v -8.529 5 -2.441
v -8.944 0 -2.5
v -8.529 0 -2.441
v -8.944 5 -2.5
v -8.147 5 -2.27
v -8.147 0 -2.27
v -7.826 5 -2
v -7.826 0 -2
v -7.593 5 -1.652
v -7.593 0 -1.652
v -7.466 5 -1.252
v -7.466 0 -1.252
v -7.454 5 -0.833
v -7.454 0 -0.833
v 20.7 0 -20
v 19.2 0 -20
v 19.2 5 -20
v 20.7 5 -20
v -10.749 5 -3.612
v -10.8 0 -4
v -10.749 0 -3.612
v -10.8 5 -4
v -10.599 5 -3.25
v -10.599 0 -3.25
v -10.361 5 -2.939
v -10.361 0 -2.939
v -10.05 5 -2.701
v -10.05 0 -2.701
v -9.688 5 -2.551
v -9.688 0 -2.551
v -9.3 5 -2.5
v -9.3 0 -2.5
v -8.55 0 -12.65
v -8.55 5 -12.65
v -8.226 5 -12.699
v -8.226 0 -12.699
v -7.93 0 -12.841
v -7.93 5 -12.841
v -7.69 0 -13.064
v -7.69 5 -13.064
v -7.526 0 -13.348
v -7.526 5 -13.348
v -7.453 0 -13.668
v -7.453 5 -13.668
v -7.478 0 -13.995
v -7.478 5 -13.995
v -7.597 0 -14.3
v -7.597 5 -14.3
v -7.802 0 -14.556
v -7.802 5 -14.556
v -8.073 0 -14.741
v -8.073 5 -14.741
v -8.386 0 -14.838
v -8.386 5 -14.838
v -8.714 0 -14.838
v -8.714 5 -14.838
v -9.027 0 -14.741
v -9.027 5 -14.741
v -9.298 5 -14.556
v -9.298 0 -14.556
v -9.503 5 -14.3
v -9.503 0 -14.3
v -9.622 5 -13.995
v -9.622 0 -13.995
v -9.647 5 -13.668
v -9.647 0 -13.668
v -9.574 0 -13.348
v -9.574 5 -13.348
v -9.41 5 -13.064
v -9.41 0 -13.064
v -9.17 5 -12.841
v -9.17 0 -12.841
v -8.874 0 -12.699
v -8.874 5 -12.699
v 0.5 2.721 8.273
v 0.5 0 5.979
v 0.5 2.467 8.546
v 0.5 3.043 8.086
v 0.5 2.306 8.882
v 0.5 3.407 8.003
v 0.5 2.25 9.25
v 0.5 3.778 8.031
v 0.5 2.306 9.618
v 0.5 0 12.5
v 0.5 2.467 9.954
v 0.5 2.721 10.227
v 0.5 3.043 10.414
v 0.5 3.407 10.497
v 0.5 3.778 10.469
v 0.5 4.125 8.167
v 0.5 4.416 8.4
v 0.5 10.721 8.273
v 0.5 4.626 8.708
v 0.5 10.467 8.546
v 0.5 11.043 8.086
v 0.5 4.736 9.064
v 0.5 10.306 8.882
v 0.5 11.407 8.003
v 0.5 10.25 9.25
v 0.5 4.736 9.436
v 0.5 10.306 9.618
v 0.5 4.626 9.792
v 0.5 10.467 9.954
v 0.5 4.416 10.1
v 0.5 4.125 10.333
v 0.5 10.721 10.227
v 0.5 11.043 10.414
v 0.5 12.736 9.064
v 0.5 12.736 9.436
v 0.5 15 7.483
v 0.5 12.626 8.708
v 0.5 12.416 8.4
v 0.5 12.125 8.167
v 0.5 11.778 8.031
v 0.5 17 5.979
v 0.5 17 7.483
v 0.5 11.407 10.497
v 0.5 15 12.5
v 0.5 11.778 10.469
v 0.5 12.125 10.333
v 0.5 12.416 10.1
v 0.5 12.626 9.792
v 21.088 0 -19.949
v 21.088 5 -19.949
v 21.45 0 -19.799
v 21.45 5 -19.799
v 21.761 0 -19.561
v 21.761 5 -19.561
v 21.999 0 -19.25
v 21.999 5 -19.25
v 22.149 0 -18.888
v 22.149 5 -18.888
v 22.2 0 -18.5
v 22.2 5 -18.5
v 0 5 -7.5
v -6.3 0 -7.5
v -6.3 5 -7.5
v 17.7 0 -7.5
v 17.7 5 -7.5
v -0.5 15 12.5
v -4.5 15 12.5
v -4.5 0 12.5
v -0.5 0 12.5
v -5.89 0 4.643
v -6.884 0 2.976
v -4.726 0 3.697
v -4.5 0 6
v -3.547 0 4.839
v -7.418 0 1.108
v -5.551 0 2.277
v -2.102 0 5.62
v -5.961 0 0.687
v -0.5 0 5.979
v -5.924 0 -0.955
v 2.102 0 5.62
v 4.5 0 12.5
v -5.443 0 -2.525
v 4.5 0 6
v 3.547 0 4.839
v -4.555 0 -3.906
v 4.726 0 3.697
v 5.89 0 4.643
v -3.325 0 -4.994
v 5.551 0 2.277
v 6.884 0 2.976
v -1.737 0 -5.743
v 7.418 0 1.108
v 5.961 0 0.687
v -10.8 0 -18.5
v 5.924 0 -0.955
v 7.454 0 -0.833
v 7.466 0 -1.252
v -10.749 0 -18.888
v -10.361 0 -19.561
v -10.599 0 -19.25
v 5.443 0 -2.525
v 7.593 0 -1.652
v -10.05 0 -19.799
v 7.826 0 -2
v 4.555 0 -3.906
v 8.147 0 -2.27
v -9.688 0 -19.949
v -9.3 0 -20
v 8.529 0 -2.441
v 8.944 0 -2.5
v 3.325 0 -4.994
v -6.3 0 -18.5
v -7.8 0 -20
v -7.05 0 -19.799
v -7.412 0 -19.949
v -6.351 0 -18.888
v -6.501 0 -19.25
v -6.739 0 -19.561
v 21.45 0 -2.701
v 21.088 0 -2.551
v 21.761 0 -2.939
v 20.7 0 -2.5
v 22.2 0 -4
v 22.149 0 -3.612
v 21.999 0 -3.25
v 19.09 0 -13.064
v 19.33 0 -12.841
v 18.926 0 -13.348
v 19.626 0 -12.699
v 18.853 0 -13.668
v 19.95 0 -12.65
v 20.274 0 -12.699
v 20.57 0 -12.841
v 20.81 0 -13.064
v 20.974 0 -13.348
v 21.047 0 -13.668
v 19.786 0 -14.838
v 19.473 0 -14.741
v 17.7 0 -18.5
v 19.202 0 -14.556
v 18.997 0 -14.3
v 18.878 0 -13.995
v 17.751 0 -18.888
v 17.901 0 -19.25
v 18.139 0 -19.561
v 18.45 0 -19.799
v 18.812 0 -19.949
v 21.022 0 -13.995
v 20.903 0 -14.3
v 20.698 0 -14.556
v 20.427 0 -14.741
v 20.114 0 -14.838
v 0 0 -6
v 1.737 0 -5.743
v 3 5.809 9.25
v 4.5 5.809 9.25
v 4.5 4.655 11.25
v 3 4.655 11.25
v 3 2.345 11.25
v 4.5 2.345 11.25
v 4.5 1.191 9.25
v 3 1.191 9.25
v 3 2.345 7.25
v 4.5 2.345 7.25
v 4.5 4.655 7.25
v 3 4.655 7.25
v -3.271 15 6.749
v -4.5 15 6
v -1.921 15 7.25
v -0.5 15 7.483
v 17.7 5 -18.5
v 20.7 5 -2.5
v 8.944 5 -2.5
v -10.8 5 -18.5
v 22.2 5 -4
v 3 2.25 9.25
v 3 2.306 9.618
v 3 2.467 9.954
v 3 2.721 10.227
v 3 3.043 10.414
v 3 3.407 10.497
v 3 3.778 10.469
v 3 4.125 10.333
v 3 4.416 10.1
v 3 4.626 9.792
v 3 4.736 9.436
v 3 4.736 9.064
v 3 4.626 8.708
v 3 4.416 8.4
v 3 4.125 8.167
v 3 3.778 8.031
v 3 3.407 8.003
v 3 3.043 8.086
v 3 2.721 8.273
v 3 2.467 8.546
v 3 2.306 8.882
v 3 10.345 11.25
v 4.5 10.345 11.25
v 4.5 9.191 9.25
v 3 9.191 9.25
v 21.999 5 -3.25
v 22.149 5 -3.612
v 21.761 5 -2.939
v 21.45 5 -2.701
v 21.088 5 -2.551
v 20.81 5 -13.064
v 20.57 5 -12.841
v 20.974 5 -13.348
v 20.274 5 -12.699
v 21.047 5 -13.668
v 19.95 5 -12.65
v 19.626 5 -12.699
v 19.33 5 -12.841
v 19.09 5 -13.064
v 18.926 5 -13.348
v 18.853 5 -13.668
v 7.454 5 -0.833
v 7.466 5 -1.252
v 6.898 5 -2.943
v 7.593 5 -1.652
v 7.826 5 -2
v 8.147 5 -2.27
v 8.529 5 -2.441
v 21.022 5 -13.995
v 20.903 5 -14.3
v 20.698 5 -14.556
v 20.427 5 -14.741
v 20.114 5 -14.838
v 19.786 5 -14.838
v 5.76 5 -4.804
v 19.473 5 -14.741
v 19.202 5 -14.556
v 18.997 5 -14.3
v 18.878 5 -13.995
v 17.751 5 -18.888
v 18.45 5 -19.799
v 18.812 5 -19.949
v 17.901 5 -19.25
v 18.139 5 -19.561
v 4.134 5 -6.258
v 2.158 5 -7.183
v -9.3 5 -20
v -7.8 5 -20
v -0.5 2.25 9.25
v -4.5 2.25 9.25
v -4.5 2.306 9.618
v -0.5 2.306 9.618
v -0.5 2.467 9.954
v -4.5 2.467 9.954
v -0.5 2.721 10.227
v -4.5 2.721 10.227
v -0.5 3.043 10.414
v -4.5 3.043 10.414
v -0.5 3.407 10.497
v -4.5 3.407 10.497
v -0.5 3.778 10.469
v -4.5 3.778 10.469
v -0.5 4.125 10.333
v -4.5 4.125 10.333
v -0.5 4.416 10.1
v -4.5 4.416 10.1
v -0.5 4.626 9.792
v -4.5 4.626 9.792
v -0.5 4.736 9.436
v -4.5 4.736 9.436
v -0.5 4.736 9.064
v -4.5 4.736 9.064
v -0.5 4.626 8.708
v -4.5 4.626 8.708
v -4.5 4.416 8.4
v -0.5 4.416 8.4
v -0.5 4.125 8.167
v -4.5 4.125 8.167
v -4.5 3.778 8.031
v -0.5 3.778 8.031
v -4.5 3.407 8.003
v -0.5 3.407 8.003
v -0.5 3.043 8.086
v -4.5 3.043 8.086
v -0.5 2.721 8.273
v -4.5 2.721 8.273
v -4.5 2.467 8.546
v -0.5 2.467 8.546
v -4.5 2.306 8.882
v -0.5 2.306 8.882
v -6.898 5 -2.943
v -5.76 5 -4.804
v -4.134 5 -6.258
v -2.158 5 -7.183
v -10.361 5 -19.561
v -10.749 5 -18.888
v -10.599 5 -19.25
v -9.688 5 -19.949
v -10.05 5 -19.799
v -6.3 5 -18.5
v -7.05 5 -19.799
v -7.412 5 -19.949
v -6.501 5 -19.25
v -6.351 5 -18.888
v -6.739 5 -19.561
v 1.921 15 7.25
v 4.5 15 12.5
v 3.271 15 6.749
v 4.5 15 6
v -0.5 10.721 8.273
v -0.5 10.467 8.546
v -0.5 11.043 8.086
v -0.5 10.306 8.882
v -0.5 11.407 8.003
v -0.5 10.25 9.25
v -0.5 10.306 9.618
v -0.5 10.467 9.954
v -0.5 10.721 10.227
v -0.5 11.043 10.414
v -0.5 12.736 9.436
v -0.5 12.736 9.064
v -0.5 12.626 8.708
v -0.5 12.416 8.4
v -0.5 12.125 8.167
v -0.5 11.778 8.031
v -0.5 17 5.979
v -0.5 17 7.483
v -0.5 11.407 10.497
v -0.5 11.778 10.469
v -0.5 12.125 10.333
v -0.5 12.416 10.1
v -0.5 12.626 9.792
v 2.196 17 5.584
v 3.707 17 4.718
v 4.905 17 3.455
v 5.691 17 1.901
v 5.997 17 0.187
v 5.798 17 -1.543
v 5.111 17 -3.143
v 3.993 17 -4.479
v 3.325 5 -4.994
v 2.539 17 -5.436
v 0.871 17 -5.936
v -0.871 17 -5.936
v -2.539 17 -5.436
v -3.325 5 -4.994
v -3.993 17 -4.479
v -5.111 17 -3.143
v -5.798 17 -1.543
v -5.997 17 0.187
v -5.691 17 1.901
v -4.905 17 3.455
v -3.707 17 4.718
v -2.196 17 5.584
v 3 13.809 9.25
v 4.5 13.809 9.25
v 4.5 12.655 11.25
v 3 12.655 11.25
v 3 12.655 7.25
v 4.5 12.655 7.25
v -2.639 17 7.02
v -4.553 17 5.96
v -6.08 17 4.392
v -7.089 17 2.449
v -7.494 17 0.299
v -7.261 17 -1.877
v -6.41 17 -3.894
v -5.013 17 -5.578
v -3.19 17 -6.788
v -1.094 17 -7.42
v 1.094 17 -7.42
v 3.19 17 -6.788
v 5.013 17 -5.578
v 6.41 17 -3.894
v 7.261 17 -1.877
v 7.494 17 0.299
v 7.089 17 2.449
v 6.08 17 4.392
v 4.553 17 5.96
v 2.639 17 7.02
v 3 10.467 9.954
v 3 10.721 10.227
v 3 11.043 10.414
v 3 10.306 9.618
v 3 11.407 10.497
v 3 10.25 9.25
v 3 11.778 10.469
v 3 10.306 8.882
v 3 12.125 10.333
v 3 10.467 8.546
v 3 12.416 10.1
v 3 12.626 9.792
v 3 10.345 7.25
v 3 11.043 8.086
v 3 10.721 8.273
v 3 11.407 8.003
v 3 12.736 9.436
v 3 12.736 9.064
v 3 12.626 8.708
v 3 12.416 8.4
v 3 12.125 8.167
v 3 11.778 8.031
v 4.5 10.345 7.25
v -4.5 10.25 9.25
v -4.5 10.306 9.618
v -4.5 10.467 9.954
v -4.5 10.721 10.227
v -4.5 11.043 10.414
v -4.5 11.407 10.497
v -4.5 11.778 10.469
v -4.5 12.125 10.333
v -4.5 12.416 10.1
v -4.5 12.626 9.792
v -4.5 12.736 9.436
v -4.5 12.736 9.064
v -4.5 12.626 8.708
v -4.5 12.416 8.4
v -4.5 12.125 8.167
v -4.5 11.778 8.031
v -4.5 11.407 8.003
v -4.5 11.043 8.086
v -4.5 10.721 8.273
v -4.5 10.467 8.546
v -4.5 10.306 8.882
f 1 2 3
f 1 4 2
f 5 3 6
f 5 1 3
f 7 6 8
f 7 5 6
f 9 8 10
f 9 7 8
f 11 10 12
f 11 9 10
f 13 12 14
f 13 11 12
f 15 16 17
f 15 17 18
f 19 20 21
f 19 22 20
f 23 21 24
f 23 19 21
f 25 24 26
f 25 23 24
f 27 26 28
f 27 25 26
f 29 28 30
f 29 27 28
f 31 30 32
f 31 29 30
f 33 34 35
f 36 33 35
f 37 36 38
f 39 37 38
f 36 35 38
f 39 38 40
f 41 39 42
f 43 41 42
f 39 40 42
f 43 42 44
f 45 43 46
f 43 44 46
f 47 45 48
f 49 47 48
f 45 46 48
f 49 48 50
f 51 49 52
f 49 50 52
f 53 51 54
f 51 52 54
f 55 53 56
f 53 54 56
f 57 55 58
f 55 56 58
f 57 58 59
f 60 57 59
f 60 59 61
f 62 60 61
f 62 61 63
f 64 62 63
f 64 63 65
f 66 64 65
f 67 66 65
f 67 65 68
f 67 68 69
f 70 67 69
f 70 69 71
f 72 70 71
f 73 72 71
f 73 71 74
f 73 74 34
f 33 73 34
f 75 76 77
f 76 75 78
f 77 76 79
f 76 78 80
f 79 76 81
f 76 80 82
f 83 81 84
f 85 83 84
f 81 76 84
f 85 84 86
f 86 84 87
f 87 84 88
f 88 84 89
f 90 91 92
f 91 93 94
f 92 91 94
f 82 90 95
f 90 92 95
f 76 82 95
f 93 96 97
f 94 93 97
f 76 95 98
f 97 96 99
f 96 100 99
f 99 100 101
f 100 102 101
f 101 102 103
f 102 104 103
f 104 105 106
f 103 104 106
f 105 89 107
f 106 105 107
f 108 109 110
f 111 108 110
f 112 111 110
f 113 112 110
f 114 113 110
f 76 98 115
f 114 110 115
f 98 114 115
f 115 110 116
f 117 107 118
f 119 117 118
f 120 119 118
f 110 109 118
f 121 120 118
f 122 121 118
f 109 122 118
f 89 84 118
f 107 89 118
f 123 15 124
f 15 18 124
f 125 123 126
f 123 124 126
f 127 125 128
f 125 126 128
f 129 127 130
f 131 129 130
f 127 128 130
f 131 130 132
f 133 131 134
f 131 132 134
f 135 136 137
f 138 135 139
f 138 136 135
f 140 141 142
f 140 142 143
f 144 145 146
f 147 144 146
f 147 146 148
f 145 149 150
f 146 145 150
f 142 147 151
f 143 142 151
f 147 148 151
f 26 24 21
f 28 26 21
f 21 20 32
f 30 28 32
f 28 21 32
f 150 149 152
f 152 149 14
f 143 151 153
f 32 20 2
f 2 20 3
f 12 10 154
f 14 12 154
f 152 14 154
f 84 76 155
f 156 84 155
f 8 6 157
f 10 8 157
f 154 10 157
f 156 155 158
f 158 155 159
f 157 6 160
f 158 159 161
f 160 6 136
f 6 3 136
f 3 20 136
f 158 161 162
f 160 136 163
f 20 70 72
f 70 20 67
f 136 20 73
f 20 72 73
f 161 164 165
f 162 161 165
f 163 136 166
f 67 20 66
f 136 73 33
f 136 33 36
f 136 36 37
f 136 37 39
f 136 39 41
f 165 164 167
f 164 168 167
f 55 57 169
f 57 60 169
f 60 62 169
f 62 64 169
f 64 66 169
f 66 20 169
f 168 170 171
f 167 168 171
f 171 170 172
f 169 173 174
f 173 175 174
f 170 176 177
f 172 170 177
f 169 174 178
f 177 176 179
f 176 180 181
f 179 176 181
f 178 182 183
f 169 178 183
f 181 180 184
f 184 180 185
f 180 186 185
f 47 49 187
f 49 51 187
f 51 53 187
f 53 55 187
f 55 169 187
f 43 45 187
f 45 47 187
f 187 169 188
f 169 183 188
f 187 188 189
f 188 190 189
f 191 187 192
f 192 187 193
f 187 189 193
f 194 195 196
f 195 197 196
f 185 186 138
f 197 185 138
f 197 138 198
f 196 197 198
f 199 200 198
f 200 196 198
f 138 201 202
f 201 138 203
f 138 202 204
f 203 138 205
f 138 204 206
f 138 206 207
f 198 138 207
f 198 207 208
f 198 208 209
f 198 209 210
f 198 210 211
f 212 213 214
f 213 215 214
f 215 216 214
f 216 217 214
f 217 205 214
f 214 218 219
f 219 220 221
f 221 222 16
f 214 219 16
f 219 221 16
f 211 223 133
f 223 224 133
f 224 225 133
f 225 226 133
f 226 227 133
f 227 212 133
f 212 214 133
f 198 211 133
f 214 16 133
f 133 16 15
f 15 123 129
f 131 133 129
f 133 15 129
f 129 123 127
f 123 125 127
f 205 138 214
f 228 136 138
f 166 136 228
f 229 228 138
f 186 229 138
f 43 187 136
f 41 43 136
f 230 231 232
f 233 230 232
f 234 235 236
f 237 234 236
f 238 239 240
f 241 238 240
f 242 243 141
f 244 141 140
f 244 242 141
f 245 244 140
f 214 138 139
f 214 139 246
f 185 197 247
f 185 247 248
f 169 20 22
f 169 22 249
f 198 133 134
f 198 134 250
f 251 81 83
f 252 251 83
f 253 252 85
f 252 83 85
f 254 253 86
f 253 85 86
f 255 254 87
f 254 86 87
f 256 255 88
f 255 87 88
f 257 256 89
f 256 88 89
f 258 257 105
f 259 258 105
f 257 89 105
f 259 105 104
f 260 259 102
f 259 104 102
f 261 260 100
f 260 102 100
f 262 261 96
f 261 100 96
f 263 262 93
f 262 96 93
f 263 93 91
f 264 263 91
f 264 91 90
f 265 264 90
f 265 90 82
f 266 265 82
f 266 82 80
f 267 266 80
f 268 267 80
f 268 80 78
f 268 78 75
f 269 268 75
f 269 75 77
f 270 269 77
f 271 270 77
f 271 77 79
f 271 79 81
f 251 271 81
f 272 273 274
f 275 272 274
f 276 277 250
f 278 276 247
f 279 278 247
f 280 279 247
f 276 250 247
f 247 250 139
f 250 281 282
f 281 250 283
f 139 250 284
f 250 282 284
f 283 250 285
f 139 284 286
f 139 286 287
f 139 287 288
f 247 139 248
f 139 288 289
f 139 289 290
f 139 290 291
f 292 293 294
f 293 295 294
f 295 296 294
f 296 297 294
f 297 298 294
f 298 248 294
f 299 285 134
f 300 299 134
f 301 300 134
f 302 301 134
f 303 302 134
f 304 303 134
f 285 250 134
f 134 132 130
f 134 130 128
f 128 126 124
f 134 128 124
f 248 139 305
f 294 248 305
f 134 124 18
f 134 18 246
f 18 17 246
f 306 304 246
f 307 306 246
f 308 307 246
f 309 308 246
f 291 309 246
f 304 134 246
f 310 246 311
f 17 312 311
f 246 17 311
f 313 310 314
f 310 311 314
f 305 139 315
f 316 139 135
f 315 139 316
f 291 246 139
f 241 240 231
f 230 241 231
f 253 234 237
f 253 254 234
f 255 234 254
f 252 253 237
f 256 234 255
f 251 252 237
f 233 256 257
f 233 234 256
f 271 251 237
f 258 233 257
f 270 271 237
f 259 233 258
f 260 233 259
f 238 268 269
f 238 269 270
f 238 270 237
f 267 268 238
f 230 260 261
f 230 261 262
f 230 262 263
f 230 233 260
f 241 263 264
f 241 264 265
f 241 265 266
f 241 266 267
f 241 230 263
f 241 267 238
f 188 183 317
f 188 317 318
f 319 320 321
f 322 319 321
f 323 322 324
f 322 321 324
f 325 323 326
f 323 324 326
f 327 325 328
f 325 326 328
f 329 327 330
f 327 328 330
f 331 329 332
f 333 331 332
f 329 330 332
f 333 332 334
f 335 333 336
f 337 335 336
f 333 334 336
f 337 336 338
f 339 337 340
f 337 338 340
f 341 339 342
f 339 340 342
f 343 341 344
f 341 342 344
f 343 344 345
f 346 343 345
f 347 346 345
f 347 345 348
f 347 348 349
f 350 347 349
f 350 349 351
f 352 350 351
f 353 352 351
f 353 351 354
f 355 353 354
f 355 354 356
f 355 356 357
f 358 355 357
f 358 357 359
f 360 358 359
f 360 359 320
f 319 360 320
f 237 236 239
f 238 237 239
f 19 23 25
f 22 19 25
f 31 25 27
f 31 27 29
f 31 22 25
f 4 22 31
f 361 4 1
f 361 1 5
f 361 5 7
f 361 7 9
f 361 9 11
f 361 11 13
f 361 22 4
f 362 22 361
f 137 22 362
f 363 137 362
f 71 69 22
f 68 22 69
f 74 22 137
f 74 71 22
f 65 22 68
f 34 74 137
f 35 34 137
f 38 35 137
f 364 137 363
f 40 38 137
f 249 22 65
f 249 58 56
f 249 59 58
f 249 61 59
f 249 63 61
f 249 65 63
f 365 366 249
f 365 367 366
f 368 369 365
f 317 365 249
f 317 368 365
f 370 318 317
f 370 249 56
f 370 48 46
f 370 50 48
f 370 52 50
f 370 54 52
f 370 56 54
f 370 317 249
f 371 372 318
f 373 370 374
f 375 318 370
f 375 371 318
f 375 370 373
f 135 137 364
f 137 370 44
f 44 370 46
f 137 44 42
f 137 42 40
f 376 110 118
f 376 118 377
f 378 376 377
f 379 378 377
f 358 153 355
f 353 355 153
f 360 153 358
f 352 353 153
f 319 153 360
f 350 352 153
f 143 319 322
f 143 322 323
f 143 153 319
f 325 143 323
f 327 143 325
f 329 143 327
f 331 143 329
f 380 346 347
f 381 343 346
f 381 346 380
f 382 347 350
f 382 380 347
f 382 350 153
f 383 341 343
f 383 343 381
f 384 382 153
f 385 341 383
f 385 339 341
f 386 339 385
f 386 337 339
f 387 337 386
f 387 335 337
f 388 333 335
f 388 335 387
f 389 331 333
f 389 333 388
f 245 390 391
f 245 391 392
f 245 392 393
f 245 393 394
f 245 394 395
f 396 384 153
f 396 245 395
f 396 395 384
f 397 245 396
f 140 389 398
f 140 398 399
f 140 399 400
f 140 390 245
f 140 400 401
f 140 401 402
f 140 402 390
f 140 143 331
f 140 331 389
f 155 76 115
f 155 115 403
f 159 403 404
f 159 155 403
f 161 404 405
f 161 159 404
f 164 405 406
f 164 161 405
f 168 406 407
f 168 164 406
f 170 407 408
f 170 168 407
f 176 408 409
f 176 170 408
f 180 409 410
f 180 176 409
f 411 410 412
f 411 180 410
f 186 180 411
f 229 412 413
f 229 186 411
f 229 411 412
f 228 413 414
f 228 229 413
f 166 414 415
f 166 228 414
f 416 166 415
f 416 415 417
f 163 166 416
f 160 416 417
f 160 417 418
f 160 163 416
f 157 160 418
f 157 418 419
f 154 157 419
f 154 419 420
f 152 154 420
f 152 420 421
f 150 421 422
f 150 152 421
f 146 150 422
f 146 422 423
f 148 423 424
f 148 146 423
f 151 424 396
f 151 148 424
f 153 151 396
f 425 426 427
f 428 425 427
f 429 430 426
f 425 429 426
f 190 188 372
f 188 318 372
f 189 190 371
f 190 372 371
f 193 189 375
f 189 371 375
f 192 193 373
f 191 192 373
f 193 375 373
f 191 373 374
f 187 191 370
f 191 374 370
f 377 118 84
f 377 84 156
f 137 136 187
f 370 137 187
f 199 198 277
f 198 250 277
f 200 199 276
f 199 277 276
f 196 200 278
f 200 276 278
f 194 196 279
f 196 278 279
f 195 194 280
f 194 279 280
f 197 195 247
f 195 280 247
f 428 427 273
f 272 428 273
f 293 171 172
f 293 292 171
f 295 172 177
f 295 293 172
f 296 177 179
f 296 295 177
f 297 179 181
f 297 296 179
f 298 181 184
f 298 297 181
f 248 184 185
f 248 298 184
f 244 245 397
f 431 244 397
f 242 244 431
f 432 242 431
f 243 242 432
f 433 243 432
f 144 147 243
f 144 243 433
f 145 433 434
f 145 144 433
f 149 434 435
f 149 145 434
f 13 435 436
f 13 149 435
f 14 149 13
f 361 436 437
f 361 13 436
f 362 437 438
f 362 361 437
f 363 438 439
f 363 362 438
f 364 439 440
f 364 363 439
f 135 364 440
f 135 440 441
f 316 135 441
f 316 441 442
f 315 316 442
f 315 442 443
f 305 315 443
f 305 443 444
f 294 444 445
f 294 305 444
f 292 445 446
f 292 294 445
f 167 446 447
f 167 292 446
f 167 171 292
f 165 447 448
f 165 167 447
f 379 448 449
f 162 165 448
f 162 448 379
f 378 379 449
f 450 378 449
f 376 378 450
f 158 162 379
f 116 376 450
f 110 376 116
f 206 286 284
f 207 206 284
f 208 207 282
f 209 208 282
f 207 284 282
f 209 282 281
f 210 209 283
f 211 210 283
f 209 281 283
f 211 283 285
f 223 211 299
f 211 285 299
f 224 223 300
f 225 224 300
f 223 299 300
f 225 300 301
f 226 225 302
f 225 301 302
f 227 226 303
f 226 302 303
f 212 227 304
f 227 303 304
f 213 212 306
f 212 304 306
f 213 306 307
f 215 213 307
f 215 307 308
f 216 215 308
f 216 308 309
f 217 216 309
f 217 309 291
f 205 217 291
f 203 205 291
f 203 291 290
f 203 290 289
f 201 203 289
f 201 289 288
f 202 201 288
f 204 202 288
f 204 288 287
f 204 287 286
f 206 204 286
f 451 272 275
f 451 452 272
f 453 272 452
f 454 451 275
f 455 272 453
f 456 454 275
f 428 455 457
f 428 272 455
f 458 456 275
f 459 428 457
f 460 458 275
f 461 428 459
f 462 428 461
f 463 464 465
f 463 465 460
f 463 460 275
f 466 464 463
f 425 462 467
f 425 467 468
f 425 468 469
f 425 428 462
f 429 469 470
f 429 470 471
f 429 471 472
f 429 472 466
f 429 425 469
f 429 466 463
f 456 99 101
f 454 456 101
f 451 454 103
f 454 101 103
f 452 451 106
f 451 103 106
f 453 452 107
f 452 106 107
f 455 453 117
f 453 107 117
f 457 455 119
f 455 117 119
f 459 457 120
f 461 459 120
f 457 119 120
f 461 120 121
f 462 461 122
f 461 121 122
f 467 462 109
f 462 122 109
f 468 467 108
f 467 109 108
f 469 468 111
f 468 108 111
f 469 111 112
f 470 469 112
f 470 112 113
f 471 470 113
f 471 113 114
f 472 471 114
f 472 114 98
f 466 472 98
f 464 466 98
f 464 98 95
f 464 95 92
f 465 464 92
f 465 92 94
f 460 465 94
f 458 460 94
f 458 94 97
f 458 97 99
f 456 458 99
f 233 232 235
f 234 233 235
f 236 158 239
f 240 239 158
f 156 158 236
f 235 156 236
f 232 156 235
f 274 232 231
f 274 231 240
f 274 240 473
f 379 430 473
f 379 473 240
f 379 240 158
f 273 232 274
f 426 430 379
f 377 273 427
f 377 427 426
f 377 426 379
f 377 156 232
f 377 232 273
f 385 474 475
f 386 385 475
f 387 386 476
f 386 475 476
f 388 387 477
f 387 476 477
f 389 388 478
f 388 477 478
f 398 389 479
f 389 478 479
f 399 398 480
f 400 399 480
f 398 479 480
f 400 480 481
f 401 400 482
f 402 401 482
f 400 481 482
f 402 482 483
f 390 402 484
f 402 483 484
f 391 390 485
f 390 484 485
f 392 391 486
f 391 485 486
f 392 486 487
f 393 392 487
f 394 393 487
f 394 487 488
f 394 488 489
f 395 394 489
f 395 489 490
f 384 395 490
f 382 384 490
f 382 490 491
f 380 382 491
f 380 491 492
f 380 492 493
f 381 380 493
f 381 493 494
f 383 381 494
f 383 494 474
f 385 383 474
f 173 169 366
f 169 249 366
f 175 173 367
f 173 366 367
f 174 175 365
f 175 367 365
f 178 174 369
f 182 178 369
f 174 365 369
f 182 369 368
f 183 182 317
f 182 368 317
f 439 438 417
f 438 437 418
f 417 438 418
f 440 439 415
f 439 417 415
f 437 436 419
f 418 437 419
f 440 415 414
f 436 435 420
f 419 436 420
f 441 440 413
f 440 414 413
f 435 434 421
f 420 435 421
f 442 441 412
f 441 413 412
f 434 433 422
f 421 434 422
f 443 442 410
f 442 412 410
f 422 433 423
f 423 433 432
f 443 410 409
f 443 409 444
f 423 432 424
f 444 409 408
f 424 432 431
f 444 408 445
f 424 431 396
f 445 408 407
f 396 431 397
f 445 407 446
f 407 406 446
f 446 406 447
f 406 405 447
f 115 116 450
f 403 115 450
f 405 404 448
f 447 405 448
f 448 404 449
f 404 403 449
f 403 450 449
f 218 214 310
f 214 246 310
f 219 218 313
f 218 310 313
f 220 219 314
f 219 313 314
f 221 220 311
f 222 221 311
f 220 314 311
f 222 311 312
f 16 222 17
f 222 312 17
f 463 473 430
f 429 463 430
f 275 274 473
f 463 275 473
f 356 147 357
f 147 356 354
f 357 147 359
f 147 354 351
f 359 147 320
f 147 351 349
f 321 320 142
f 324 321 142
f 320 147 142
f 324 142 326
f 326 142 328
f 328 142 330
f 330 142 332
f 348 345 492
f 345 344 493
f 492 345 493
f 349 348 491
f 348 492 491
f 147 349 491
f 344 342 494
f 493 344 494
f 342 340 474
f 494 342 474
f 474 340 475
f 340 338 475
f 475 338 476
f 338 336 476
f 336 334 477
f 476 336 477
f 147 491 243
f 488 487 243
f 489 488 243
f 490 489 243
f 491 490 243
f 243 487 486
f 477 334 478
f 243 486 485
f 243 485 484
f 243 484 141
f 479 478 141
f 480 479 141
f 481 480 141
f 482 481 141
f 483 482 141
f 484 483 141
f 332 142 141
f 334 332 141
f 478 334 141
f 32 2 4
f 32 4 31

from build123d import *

# Parameters (mm, degrees)
SKETCH_1_R                  = 7.5
SKETCH_1_R_2                = 6
EXTRUDE_1_DEPTH             = 17
CUT_EXTRUDE_1_REACH         = 25.88
CUT_EXTRUDE_1_END_RADIUS    = 6
SKETCH_2_W                  = 1
SKETCH_2_H                  = 17
SKETCH_3_W                  = 4
SKETCH_3_H                  = 17
EXTRUDE_2_DEPTH             = 5
EXTRUDE_2_DIRECTION_2_REACH = 25.88
CUT_EXTRUDE_START           = -2
CUT_EXTRUDE_4_DEPTH         = 2
CUT_EXTRUDE_2_REACH         = 26.274
SKETCH_4_R                  = 1.25
CUT_EXTRUDE_3_DEPTH         = 1.5
EXTRUDE_6_DEPTH             = 5
SKETCH_13_W                 = 4.5
SKETCH_13_H                 = 12.5
EXTRUDE_7_DEPTH             = 5
CUT_EXTRUDE_5_REACH         = 34.2
SKETCH_11_R                 = 1.1
FILLET_1_R                  = 1.5


with BuildPart() as part:
    # 草图1 → 凸台-拉伸1 (new body)
    with BuildSketch(Plane(origin=(0, 0, 0), x_dir=(1, 0, 0), z_dir=(0, 1, 0))):
        with Locations(Location((0, 0, 0), (0, 0, 270))):
            Circle(SKETCH_1_R)
        with Locations(Location((0, 0, 0), (0, 0, 270))):
            Circle(SKETCH_1_R_2, mode=Mode.SUBTRACT)
    extrude(amount=EXTRUDE_1_DEPTH)

    # 切除-拉伸1: up to this cylinder (the profile starts outside it)
    cut_extrude_1_end = Plane(origin=(0, 8.5, 0), z_dir=(0, -1, 0)) * Cylinder(CUT_EXTRUDE_1_END_RADIUS, 64.76, mode=Mode.PRIVATE)
    # 草图2 → 切除-拉伸1 (cut, up to the surface)
    with BuildSketch(Plane.XY.offset(7.5), mode=Mode.PRIVATE) as cut_extrude_1_sk1:
        with Locations((0, 8.5)):
            Rectangle(SKETCH_2_W, SKETCH_2_H)
    cut_extrude_1_tool1 = extrude(cut_extrude_1_sk1.sketch, amount=-CUT_EXTRUDE_1_REACH, mode=Mode.PRIVATE) - cut_extrude_1_end
    add(cut_extrude_1_tool1.solids().sort_by_distance((0, 8.5, 7.5))[0], mode=Mode.SUBTRACT)

    # 草图3 → 凸台-拉伸2 (add)
    with BuildSketch(Plane.XY.offset(7.5)):
        with Locations((-2.5, 8.5)):
            Rectangle(SKETCH_3_W, SKETCH_3_H)
        with Locations((2.5, 8.5)):
            Rectangle(SKETCH_3_W, SKETCH_3_H)
    extrude(amount=EXTRUDE_2_DEPTH)

    # 草图3 → 凸台-拉伸2 direction 2 (add, up to next)
    with BuildSketch(Plane.XY.offset(7.5), mode=Mode.PRIVATE) as extrude_2_direction_2_sk1:
        with Locations((-2.5, 8.5)):
            Rectangle(SKETCH_3_W, SKETCH_3_H)
    extrude_2_direction_2_tool1 = extrude(extrude_2_direction_2_sk1.sketch, amount=-EXTRUDE_2_DIRECTION_2_REACH, mode=Mode.PRIVATE) - part.part
    # 草图3 → 凸台-拉伸2 direction 2 (add, up to next)
    with BuildSketch(Plane.XY.offset(7.5), mode=Mode.PRIVATE) as extrude_2_direction_2_sk2:
        with Locations((2.5, 8.5)):
            Rectangle(SKETCH_3_W, SKETCH_3_H)
    extrude_2_direction_2_tool2 = extrude(extrude_2_direction_2_sk2.sketch, amount=-EXTRUDE_2_DIRECTION_2_REACH, mode=Mode.PRIVATE) - part.part
    add(extrude_2_direction_2_tool1.solids().sort_by_distance((-2.5, 8.5, 7.5))[0])
    add(extrude_2_direction_2_tool2.solids().sort_by_distance((2.5, 8.5, 7.5))[0])

    # 草图7 → 切除-拉伸4 (cut)
    with BuildSketch(Plane(origin=(0, 17, 0), x_dir=(1, 0, 0), z_dir=(0, 1, 0)).offset(CUT_EXTRUDE_START)):
        with BuildLine():
            Line((-4.5, -6), (-4.5, -12.5))
            Line((-4.5, -12.5), (4.5, -12.5))
            Line((4.5, -12.5), (4.5, -6))
            ThreePointArc((4.5, -6), (0, -7.5), (-4.5, -6))
        make_face()
    extrude(amount=CUT_EXTRUDE_4_DEPTH, mode=Mode.SUBTRACT)

    # 切除-拉伸2: up to this face of the body (flat: up to its plane)
    cut_extrude_2_end = Plane(part.part.faces().sort_by_distance((4.5, 7.5, 9.25))[0])
    # 草图4 → 切除-拉伸2 (cut, up to the picked face)
    with BuildSketch(Plane.ZY.offset(4.5), mode=Mode.PRIVATE) as cut_extrude_2_sk1:
        with Locations(Location((9.25, 11.5, 0), (0, 0, 270))):
            Circle(SKETCH_4_R)
    cut_extrude_2_tool1 = split(extrude(cut_extrude_2_sk1.sketch, amount=-CUT_EXTRUDE_2_REACH, mode=Mode.PRIVATE), bisect_by=cut_extrude_2_end, keep=Keep.BOTH, mode=Mode.PRIVATE)
    # 草图4 → 切除-拉伸2 (cut, up to the picked face)
    with BuildSketch(Plane.ZY.offset(4.5), mode=Mode.PRIVATE) as cut_extrude_2_sk2:
        with Locations(Location((9.25, 3.5, 0), (0, 0, 270))):
            Circle(SKETCH_4_R)
    cut_extrude_2_tool2 = split(extrude(cut_extrude_2_sk2.sketch, amount=-CUT_EXTRUDE_2_REACH, mode=Mode.PRIVATE), bisect_by=cut_extrude_2_end, keep=Keep.BOTH, mode=Mode.PRIVATE)
    add(cut_extrude_2_tool1.solids().sort_by(Axis((-4.5, 11.5, 9.25), (1, 0, 0)))[0], mode=Mode.SUBTRACT)
    add(cut_extrude_2_tool2.solids().sort_by(Axis((-4.5, 3.5, 9.25), (1, 0, 0)))[0], mode=Mode.SUBTRACT)

    # 草图5 → 切除-拉伸3 (cut)
    with BuildSketch(Plane(origin=(4.5, 0, 0), x_dir=(0, 0, -1), z_dir=(1, 0, 0))):
        Polygon((-9.25, 9.190598923), (-7.25, 10.345299462), (-7.25, 12.654700538), (-9.25, 13.809401077), (-11.25, 12.654700538), (-11.25, 10.345299462), align=None)
        Polygon((-9.25, 1.190598923), (-7.25, 2.345299462), (-7.25, 4.654700538), (-9.25, 5.809401077), (-11.25, 4.654700538), (-11.25, 2.345299462), align=None)
    extrude(amount=-CUT_EXTRUDE_3_DEPTH, mode=Mode.SUBTRACT)

    # 草图12 → 凸台-拉伸6 (add)
    with BuildSketch(Plane(origin=(0, 0, 0), x_dir=(1, 0, 0), z_dir=(0, 1, 0))):
        Polygon((-10.8, 7.5), (22.2, 7.5), (22.2, 2.5), (7.071067812, 2.5), (0, 7.208487923), (-7.071067812, 2.5), (-10.8, 2.5), align=None)
    extrude(amount=EXTRUDE_6_DEPTH)

    # 草图13 → 凸台-拉伸7 (add)
    with BuildSketch(Plane(origin=(0, 0, 0), x_dir=(1, 0, 0), z_dir=(0, 1, 0))):
        with Locations((-8.55, 13.75)):
            Rectangle(SKETCH_13_W, SKETCH_13_H)
        with Locations((19.95, 13.75)):
            Rectangle(SKETCH_13_W, SKETCH_13_H)
    extrude(amount=EXTRUDE_7_DEPTH)

    # 草图11 → 切除-拉伸5 (cut, up to next)
    with BuildSketch(Plane(origin=(0, 5, 0), x_dir=(1, 0, 0), z_dir=(0, 1, 0)), mode=Mode.PRIVATE) as cut_extrude_5_sk1:
        with Locations(Location((-8.55, 13.75, 0), (0, 0, 270))):
            Circle(SKETCH_11_R)
    cut_extrude_5_tool1 = extrude(cut_extrude_5_sk1.sketch, amount=-CUT_EXTRUDE_5_REACH, mode=Mode.PRIVATE) & part.part
    # 草图11 → 切除-拉伸5 (cut, up to next)
    with BuildSketch(Plane(origin=(0, 5, 0), x_dir=(1, 0, 0), z_dir=(0, 1, 0)), mode=Mode.PRIVATE) as cut_extrude_5_sk2:
        with Locations(Location((19.95, 13.75, 0), (0, 0, 270))):
            Circle(SKETCH_11_R)
    cut_extrude_5_tool2 = extrude(cut_extrude_5_sk2.sketch, amount=-CUT_EXTRUDE_5_REACH, mode=Mode.PRIVATE) & part.part
    add(cut_extrude_5_tool1.solids().sort_by_distance((-8.55, 5, -13.75))[0], mode=Mode.SUBTRACT)
    add(cut_extrude_5_tool2.solids().sort_by_distance((19.95, 5, -13.75))[0], mode=Mode.SUBTRACT)

    # 圆角1
    fillet_1_edges = [part.edges().sort_by_distance(p)[0] for p in [
        (-10.8, 2.5, -2.5),
        (-7.071067812, 2.5, -2.5),
        (7.071067812, 2.5, -2.5),
        (22.2, 2.5, -2.5),
        (-10.8, 2.5, -20),
        (-6.3, 2.5, -20),
        (22.2, 2.5, -20),
        (17.7, 2.5, -20),
    ]]
    fillet(fillet_1_edges, radius=FILLET_1_R)


solid = part.part
